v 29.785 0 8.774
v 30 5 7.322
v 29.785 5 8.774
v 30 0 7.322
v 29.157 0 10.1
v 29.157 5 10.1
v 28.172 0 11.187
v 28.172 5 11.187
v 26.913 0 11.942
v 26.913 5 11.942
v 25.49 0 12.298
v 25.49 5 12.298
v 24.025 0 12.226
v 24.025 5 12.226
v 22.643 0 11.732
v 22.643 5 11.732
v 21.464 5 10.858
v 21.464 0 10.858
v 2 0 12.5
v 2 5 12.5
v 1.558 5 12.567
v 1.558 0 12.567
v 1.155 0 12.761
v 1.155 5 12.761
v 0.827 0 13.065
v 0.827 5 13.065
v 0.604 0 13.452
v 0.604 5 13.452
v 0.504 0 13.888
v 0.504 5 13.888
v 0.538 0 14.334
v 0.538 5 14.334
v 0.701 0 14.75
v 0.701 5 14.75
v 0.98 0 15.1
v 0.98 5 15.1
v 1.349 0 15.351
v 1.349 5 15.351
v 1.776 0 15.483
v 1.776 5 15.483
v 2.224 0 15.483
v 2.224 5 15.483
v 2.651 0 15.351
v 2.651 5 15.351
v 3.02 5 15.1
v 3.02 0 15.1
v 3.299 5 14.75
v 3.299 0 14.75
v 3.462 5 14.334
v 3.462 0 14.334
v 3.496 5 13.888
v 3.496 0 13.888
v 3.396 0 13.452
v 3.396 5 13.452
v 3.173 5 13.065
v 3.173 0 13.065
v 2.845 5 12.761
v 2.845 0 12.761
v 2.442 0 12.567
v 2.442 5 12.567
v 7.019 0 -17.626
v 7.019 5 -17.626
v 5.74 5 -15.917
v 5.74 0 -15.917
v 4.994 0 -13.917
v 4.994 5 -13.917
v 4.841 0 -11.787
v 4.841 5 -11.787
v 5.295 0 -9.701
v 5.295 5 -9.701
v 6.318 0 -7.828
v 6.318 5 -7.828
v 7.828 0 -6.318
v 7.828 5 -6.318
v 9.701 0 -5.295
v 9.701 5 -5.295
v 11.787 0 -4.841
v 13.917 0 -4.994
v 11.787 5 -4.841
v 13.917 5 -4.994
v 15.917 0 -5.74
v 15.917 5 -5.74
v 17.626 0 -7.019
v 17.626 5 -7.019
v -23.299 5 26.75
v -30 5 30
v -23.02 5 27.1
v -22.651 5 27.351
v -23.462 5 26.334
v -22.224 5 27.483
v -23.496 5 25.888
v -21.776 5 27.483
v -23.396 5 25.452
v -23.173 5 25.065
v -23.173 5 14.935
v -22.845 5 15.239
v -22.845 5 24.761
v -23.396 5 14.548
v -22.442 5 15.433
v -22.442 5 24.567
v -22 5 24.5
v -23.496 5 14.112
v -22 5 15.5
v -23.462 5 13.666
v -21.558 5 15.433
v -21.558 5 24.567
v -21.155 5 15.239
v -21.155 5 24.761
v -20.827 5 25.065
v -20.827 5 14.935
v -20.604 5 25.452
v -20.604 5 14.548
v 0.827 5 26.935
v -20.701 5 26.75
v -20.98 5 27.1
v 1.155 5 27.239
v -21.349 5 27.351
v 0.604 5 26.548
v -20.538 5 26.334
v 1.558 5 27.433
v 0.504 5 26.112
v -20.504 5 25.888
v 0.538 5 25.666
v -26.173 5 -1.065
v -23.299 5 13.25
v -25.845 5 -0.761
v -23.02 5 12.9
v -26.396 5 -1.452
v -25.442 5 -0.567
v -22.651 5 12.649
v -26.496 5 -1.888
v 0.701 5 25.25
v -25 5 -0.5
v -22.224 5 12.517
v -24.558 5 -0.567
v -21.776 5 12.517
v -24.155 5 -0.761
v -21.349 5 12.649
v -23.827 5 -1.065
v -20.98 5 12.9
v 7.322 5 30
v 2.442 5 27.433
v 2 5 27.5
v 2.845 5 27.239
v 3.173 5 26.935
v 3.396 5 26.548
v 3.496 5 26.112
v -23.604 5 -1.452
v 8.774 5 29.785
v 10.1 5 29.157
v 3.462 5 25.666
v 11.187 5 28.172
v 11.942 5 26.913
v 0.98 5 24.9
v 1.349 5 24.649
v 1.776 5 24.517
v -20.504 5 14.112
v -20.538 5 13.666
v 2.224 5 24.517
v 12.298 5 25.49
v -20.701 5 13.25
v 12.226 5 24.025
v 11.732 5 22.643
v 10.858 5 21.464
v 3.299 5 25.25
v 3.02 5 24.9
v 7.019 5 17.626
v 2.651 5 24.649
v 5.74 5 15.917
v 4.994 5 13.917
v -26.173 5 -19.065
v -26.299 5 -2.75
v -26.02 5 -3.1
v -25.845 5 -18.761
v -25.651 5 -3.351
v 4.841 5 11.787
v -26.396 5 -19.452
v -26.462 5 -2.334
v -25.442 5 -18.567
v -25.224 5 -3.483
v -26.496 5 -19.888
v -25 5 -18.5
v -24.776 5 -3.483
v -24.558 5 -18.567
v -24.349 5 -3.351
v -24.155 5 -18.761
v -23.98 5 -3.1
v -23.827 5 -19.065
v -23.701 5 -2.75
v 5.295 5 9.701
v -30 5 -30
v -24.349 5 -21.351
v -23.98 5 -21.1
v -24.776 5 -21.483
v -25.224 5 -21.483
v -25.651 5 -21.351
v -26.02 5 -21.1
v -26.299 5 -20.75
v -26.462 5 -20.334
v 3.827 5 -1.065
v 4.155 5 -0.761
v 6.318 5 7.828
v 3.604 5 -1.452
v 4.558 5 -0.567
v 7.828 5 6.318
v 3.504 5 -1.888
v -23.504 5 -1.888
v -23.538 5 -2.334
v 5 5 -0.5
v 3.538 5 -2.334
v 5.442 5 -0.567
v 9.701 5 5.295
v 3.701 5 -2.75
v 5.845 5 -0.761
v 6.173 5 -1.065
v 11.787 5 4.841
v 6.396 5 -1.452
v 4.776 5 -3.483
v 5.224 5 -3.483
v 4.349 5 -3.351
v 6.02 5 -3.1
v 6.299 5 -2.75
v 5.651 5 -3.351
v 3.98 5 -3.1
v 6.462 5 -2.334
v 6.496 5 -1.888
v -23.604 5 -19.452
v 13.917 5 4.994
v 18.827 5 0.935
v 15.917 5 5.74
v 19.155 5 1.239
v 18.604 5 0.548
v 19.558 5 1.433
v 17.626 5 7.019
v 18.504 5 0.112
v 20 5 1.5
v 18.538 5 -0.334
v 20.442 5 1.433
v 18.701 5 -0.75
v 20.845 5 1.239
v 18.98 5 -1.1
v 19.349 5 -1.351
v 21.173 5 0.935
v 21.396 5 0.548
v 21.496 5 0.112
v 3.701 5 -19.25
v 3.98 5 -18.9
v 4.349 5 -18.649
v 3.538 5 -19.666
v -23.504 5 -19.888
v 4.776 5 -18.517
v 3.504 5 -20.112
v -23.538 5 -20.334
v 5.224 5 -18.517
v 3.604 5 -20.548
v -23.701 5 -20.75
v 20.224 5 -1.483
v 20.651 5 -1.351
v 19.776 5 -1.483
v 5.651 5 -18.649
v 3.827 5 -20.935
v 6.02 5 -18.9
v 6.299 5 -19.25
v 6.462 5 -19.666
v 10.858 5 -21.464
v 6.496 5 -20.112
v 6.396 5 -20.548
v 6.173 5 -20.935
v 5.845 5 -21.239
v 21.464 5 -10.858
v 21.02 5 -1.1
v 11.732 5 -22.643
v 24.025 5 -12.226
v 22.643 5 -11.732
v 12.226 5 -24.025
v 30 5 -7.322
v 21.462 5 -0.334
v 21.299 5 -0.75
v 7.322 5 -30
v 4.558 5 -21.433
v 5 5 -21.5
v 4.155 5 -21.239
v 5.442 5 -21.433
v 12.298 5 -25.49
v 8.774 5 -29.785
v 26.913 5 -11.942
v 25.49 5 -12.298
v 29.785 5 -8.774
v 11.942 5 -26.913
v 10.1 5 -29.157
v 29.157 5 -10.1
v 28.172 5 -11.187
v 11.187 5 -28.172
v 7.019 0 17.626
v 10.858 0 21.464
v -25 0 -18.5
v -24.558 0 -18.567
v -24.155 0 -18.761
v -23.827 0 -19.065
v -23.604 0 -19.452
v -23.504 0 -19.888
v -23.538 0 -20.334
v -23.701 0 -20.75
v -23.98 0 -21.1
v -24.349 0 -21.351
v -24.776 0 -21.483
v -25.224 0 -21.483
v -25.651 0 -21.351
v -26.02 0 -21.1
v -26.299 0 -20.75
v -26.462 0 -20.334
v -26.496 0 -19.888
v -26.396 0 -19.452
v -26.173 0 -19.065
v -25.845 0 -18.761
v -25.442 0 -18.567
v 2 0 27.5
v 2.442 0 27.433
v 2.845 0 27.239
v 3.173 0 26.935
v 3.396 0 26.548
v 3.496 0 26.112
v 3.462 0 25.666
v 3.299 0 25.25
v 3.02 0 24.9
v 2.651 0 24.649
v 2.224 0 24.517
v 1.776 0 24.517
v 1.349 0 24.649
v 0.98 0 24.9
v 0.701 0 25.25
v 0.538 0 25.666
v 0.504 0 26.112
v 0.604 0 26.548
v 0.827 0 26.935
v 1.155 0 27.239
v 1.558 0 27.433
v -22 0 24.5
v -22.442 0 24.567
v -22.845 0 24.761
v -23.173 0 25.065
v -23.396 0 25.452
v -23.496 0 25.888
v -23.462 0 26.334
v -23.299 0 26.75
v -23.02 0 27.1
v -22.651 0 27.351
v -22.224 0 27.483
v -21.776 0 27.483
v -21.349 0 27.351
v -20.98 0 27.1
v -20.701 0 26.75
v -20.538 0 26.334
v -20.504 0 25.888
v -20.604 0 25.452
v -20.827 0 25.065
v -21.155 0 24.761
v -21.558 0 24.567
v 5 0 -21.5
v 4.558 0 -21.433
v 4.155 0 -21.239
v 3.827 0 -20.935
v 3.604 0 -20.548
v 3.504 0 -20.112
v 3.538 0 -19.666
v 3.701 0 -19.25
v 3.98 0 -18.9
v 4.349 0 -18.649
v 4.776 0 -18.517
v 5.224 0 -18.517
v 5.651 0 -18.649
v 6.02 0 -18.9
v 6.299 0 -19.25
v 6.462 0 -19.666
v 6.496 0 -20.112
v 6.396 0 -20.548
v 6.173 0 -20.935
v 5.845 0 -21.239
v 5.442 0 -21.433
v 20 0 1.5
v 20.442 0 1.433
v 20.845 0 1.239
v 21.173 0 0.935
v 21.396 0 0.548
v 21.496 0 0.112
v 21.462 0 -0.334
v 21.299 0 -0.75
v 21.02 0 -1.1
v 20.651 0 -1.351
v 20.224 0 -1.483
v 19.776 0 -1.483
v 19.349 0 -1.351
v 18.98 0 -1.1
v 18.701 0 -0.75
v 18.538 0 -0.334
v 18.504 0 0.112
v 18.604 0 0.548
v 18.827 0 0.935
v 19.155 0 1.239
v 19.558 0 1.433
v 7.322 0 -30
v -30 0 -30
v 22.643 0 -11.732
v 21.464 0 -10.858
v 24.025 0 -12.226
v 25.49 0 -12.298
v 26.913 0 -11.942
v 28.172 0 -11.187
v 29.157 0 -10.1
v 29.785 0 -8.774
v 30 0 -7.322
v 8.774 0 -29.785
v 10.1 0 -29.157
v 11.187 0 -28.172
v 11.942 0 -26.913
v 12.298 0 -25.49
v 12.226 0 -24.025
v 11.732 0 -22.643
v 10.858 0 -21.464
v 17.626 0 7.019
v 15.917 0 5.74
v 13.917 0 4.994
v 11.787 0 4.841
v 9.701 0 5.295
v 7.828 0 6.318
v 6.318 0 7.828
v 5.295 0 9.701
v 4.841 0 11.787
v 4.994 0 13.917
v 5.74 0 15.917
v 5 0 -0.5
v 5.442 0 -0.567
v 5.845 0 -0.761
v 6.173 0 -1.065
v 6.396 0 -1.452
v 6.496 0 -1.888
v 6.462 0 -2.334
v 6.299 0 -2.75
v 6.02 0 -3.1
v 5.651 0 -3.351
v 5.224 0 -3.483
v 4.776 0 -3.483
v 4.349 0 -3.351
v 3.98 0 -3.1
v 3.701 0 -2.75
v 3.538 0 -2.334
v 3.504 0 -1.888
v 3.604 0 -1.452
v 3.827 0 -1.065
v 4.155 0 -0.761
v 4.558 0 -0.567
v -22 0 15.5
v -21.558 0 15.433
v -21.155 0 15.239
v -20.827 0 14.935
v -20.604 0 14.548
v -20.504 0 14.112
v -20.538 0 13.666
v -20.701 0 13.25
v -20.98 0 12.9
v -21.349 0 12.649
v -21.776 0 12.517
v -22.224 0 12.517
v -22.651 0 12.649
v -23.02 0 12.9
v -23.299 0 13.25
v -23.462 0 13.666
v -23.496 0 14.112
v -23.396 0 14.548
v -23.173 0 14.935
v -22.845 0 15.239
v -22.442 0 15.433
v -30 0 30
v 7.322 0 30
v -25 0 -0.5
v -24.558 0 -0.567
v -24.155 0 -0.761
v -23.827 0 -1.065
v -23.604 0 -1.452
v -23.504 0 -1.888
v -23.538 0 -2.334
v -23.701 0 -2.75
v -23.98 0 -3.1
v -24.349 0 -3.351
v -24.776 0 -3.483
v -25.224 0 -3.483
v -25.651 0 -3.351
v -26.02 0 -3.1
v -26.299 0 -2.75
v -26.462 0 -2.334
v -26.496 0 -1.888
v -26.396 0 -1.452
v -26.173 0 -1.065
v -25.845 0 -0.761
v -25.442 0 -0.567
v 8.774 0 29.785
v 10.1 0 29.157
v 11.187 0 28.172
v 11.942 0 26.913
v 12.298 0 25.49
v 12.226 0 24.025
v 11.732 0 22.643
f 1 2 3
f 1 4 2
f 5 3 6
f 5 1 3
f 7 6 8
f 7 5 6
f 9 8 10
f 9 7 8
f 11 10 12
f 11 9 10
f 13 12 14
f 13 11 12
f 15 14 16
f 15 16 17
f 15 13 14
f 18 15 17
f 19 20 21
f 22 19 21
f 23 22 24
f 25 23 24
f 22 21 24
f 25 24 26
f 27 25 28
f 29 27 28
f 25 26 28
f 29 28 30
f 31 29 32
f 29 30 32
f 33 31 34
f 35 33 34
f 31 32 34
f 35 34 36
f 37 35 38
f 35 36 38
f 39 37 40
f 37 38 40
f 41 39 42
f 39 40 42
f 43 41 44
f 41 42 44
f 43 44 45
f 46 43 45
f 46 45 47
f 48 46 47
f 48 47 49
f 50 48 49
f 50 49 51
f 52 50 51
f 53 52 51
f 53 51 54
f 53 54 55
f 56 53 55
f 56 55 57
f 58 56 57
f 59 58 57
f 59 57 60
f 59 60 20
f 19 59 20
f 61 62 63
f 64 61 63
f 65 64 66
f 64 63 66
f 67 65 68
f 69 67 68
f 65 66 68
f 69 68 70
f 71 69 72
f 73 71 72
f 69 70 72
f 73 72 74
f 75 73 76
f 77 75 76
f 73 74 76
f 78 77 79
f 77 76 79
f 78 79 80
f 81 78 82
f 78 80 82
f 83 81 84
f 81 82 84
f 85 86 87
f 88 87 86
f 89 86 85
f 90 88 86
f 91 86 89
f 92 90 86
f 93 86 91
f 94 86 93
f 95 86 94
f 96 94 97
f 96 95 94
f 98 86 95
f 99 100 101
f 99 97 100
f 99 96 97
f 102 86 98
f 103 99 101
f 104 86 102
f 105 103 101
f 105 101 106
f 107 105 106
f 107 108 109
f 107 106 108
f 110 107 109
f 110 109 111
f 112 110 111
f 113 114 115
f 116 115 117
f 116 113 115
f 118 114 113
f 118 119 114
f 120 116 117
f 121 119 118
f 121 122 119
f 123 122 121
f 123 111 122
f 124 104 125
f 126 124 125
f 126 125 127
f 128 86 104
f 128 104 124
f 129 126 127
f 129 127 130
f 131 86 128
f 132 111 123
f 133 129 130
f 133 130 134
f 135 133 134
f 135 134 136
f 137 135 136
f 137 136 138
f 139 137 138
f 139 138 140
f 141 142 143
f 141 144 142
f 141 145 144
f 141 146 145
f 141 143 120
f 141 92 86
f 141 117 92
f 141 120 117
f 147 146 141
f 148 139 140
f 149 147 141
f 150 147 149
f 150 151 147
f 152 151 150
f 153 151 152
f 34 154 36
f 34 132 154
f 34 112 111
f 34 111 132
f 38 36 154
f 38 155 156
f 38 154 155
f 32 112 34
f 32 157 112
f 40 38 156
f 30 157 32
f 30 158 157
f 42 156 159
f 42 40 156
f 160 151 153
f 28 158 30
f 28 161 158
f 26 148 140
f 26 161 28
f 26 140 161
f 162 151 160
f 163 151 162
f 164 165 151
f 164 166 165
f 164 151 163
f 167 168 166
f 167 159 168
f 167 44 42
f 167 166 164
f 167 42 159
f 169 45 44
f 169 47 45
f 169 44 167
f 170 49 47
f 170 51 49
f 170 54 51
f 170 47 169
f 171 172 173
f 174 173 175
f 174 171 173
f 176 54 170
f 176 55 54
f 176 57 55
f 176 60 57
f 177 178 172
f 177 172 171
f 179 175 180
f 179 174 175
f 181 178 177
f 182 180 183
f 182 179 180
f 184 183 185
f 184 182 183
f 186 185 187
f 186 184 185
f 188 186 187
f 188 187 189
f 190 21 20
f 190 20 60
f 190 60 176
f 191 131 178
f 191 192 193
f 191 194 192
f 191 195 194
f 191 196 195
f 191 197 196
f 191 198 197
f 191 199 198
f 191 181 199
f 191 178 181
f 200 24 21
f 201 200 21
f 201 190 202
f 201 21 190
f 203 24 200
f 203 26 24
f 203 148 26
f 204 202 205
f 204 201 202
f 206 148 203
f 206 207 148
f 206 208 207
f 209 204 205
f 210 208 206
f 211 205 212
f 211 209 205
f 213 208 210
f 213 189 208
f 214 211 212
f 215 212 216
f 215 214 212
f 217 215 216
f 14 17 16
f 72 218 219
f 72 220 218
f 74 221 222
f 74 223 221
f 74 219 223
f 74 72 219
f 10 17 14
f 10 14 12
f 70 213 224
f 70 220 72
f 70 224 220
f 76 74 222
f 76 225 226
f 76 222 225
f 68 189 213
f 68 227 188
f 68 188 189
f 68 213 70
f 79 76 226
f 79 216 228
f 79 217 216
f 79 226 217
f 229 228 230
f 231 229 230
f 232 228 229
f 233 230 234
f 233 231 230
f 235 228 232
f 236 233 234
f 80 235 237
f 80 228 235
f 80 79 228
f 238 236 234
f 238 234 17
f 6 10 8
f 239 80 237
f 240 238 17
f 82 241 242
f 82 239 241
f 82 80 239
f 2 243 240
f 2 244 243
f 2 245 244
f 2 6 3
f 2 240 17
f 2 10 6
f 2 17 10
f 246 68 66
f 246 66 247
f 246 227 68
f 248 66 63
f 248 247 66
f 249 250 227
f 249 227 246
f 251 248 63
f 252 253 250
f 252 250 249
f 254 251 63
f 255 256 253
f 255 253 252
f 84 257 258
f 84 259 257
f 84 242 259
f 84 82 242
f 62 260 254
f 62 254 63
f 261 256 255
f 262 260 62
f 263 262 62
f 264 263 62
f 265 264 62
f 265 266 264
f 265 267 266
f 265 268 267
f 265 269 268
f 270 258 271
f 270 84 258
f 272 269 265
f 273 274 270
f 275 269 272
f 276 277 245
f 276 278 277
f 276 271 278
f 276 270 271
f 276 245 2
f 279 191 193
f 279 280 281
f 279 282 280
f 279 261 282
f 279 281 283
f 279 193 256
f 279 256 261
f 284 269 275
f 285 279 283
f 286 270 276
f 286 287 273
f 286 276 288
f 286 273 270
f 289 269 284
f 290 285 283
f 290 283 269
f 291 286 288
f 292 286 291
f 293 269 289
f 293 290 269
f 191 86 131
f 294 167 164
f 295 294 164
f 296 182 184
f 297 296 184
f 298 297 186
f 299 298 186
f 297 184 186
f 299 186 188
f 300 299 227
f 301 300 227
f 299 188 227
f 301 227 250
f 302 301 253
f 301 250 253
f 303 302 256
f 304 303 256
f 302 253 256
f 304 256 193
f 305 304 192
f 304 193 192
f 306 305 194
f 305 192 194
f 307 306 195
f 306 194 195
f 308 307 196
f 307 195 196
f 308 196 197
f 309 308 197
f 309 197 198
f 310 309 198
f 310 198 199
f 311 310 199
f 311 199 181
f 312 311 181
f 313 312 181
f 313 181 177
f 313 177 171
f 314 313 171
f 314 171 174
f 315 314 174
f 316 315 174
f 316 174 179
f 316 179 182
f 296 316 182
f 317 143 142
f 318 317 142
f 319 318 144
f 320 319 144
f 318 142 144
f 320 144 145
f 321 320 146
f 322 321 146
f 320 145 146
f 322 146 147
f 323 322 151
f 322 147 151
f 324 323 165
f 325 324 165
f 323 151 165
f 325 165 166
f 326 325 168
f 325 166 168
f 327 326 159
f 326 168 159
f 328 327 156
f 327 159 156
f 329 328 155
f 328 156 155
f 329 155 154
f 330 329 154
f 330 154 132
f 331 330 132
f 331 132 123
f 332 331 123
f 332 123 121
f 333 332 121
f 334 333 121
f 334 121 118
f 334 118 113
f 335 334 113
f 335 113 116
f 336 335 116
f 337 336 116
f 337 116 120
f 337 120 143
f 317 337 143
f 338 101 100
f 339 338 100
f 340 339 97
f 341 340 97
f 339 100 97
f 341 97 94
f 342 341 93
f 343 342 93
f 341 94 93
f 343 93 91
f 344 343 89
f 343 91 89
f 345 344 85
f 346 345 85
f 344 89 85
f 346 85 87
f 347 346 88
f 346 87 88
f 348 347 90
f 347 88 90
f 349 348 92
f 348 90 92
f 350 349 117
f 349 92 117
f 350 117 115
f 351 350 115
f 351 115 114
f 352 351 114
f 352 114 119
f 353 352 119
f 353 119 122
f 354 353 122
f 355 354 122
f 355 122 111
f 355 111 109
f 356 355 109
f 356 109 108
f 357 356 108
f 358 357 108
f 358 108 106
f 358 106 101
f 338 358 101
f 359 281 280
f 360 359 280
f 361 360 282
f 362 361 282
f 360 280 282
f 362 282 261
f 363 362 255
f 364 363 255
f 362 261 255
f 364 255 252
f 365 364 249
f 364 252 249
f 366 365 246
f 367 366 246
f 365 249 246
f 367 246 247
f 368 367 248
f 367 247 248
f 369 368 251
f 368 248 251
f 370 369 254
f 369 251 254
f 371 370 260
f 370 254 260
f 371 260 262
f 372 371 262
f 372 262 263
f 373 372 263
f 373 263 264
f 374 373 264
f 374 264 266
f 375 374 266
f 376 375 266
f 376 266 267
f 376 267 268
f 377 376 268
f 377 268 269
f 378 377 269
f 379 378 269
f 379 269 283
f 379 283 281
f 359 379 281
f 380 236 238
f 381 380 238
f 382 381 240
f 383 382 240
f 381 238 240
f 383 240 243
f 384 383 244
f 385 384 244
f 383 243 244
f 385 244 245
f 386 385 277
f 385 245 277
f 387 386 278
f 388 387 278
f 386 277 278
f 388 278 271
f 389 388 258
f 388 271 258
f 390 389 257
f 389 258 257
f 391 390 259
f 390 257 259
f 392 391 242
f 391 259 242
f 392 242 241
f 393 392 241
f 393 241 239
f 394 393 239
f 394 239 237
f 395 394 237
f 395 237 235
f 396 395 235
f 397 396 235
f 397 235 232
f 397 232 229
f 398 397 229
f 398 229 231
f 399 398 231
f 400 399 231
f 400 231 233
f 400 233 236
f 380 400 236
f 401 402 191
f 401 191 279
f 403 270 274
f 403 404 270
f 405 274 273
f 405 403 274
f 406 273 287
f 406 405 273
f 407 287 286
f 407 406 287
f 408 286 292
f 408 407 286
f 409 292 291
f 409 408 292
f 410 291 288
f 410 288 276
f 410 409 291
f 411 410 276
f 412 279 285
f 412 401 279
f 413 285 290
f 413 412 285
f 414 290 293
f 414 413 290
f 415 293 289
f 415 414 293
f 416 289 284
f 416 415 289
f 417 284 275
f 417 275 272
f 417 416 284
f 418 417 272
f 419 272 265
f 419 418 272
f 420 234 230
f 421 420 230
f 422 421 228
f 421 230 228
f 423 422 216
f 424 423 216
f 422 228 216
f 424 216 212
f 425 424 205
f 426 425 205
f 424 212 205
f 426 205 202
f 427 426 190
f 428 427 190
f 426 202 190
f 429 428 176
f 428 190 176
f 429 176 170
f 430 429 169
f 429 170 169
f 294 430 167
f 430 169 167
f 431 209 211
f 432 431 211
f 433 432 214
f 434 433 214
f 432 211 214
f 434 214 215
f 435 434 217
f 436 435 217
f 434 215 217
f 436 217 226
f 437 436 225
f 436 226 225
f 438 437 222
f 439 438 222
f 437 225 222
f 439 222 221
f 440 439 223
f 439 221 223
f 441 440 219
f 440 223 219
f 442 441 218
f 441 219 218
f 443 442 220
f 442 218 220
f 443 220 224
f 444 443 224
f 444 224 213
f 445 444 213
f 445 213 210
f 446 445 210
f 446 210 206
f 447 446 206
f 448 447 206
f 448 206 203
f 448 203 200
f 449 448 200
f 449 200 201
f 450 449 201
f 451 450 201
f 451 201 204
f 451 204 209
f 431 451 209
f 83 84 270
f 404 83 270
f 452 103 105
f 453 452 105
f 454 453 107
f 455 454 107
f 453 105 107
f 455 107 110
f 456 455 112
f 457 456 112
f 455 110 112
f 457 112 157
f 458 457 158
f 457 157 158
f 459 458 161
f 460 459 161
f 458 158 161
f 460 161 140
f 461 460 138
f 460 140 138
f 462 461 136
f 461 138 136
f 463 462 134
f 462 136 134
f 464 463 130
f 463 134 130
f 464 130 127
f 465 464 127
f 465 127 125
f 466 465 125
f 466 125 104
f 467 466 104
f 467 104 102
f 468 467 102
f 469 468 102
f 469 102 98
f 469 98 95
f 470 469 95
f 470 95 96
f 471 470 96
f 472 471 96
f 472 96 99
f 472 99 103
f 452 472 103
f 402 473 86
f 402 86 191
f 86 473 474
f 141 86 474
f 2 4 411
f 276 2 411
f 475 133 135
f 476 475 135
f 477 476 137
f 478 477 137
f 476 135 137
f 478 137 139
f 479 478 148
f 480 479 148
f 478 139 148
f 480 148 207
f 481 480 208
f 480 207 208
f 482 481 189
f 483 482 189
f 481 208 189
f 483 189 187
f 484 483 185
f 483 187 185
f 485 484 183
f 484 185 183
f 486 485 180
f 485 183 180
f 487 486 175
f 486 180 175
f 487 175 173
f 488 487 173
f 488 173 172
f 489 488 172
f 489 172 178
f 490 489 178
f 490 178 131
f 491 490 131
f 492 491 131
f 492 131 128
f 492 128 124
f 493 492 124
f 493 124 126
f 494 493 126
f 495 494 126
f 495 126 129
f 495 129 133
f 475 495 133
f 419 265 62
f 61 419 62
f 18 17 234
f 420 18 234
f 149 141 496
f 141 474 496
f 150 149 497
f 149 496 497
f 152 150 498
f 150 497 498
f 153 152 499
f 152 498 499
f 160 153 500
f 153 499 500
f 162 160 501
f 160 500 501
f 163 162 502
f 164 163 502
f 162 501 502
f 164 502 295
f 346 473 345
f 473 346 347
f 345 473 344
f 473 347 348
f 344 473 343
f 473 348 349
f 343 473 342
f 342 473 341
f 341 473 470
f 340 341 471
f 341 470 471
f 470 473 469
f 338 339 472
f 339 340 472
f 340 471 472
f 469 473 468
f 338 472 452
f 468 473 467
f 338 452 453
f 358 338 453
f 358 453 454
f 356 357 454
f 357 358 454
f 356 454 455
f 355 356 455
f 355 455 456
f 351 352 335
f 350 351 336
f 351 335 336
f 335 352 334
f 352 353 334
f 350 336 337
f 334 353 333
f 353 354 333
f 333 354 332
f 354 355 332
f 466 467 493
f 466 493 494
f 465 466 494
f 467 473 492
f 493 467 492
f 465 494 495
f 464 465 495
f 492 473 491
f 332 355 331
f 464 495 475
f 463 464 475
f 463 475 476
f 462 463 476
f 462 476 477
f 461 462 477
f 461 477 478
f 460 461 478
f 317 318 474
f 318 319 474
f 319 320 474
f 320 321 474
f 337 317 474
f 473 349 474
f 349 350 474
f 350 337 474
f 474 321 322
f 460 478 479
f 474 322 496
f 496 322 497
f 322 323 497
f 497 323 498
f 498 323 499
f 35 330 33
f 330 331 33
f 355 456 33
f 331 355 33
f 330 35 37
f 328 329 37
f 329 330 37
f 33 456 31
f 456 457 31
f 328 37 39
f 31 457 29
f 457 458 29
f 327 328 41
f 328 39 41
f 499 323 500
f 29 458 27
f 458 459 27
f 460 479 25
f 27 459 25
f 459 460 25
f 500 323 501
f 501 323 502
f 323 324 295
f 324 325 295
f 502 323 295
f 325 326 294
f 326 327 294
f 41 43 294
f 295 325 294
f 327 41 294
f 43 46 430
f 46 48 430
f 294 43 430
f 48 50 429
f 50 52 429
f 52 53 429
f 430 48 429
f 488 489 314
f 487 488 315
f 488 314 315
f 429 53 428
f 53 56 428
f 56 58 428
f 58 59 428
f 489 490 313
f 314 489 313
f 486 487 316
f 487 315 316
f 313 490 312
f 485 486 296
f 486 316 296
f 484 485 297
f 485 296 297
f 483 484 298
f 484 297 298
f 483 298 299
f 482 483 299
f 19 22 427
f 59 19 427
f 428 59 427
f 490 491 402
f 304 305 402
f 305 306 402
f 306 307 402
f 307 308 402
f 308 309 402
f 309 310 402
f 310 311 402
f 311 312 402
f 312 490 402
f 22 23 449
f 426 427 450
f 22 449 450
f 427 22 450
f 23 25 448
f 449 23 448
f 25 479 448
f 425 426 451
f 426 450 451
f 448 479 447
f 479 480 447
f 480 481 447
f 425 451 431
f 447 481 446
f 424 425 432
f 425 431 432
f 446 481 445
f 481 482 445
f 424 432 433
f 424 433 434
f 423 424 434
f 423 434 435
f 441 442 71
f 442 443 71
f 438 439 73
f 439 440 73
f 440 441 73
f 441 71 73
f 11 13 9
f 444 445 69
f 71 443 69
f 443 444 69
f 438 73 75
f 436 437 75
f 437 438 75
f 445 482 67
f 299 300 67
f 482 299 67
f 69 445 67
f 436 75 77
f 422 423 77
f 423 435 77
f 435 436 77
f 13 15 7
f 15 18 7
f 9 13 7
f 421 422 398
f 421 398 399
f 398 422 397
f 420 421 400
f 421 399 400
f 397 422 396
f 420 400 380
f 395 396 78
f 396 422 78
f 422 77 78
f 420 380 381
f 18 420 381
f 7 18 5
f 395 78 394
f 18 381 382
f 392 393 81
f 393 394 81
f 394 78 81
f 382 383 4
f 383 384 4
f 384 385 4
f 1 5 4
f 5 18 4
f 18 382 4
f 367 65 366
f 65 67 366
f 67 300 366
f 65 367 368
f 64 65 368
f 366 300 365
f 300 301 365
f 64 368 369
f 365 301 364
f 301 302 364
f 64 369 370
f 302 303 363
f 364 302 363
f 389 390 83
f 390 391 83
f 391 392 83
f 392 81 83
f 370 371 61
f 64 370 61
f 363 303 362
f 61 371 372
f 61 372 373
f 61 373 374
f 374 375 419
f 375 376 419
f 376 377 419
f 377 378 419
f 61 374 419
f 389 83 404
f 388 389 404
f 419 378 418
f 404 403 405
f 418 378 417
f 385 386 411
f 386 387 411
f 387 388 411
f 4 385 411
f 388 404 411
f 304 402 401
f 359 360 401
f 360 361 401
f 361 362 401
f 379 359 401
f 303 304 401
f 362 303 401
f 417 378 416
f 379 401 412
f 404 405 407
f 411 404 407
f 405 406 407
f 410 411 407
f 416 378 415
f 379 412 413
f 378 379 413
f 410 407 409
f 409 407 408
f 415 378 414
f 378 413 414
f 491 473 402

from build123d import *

# Parameters (mm, degrees)
SKETCH_1_W          = 60
SKETCH_1_H          = 60
EXTRUDE_1_DEPTH     = 5
CUT_EXTRUDE_1_DEPTH = 43.720018727
FILLET_1_R          = 5
SKETCH_3_R          = 1.5
CUT_EXTRUDE_2_DEPTH = 43.720018727


with BuildPart() as part:
    # 草图1 → 凸台-拉伸1 (new body)
    with BuildSketch(Plane(origin=(0, 0, 0), x_dir=(1, 0, 0), z_dir=(0, 1, 0))):
        Rectangle(SKETCH_1_W, SKETCH_1_H)
    extrude(amount=EXTRUDE_1_DEPTH)

    # 草图2 → 切除-拉伸1 (cut, through all)
    with BuildSketch(Plane(origin=(0, 5, 0), x_dir=(1, 0, 0), z_dir=(0, 1, 0))):
        with BuildLine():
            Line((19.393398282, 30), (7.019029611, 17.625631329))
            ThreePointArc((7.019029611, 17.625631329), (7.019029611, 7.019029611), (17.625631329, 7.019029611))
            Line((17.625631329, 7.019029611), (30, 19.393398282))
            Line((30, 19.393398282), (30, 30))
            Line((30, 30), (19.393398282, 30))
        make_face()
        with BuildLine():
            Line((19.393398282, -30), (30, -30))
            Line((30, -30), (30, -19.393398282))
            Line((30, -19.393398282), (17.625631329, -7.019029611))
            ThreePointArc((17.625631329, -7.019029611), (7.019029611, -7.019029611), (7.019029611, -17.625631329))
            Line((7.019029611, -17.625631329), (19.393398282, -30))
        make_face()
    extrude(amount=-CUT_EXTRUDE_1_DEPTH, mode=Mode.SUBTRACT)

    # 圆角1
    fillet_1_edges = [part.edges().sort_by_distance(p)[0] for p in [
        (30, 2.5, -19.393398282),
        (19.393398282, 2.5, -30),
        (19.393398282, 2.5, 30),
        (30, 2.5, 19.393398282),
    ]]
    fillet(fillet_1_edges, radius=FILLET_1_R)

    # 草图3 → 切除-拉伸2 (cut, through all)
    with BuildSketch(Plane(origin=(0, 5, 0), x_dir=(1, 0, 0), z_dir=(0, 1, 0))):
        with Locations(Location((20, 0, 0), (0, 0, 270))):
            Circle(SKETCH_3_R)
        with Locations(Location((-22, -14, 0), (0, 0, 270))):
            Circle(SKETCH_3_R)
        with Locations(Location((2, -14, 0), (0, 0, 90))):
            Circle(SKETCH_3_R)
        with Locations(Location((2, -26, 0), (0, 0, 270))):
            Circle(SKETCH_3_R)
        with Locations(Location((-22, -26, 0), (0, 0, 90))):
            Circle(SKETCH_3_R)
        with Locations(Location((-25, 20, 0), (0, 0, 270))):
            Circle(SKETCH_3_R)
        with Locations(Location((5, 20, 0), (0, 0, 90))):
            Circle(SKETCH_3_R)
        with Locations(Location((-25, 2, 0), (0, 0, 270))):
            Circle(SKETCH_3_R)
        with Locations(Location((5, 2, 0), (0, 0, 270))):
            Circle(SKETCH_3_R)
    extrude(amount=-CUT_EXTRUDE_2_DEPTH, mode=Mode.SUBTRACT)


solid = part.part
